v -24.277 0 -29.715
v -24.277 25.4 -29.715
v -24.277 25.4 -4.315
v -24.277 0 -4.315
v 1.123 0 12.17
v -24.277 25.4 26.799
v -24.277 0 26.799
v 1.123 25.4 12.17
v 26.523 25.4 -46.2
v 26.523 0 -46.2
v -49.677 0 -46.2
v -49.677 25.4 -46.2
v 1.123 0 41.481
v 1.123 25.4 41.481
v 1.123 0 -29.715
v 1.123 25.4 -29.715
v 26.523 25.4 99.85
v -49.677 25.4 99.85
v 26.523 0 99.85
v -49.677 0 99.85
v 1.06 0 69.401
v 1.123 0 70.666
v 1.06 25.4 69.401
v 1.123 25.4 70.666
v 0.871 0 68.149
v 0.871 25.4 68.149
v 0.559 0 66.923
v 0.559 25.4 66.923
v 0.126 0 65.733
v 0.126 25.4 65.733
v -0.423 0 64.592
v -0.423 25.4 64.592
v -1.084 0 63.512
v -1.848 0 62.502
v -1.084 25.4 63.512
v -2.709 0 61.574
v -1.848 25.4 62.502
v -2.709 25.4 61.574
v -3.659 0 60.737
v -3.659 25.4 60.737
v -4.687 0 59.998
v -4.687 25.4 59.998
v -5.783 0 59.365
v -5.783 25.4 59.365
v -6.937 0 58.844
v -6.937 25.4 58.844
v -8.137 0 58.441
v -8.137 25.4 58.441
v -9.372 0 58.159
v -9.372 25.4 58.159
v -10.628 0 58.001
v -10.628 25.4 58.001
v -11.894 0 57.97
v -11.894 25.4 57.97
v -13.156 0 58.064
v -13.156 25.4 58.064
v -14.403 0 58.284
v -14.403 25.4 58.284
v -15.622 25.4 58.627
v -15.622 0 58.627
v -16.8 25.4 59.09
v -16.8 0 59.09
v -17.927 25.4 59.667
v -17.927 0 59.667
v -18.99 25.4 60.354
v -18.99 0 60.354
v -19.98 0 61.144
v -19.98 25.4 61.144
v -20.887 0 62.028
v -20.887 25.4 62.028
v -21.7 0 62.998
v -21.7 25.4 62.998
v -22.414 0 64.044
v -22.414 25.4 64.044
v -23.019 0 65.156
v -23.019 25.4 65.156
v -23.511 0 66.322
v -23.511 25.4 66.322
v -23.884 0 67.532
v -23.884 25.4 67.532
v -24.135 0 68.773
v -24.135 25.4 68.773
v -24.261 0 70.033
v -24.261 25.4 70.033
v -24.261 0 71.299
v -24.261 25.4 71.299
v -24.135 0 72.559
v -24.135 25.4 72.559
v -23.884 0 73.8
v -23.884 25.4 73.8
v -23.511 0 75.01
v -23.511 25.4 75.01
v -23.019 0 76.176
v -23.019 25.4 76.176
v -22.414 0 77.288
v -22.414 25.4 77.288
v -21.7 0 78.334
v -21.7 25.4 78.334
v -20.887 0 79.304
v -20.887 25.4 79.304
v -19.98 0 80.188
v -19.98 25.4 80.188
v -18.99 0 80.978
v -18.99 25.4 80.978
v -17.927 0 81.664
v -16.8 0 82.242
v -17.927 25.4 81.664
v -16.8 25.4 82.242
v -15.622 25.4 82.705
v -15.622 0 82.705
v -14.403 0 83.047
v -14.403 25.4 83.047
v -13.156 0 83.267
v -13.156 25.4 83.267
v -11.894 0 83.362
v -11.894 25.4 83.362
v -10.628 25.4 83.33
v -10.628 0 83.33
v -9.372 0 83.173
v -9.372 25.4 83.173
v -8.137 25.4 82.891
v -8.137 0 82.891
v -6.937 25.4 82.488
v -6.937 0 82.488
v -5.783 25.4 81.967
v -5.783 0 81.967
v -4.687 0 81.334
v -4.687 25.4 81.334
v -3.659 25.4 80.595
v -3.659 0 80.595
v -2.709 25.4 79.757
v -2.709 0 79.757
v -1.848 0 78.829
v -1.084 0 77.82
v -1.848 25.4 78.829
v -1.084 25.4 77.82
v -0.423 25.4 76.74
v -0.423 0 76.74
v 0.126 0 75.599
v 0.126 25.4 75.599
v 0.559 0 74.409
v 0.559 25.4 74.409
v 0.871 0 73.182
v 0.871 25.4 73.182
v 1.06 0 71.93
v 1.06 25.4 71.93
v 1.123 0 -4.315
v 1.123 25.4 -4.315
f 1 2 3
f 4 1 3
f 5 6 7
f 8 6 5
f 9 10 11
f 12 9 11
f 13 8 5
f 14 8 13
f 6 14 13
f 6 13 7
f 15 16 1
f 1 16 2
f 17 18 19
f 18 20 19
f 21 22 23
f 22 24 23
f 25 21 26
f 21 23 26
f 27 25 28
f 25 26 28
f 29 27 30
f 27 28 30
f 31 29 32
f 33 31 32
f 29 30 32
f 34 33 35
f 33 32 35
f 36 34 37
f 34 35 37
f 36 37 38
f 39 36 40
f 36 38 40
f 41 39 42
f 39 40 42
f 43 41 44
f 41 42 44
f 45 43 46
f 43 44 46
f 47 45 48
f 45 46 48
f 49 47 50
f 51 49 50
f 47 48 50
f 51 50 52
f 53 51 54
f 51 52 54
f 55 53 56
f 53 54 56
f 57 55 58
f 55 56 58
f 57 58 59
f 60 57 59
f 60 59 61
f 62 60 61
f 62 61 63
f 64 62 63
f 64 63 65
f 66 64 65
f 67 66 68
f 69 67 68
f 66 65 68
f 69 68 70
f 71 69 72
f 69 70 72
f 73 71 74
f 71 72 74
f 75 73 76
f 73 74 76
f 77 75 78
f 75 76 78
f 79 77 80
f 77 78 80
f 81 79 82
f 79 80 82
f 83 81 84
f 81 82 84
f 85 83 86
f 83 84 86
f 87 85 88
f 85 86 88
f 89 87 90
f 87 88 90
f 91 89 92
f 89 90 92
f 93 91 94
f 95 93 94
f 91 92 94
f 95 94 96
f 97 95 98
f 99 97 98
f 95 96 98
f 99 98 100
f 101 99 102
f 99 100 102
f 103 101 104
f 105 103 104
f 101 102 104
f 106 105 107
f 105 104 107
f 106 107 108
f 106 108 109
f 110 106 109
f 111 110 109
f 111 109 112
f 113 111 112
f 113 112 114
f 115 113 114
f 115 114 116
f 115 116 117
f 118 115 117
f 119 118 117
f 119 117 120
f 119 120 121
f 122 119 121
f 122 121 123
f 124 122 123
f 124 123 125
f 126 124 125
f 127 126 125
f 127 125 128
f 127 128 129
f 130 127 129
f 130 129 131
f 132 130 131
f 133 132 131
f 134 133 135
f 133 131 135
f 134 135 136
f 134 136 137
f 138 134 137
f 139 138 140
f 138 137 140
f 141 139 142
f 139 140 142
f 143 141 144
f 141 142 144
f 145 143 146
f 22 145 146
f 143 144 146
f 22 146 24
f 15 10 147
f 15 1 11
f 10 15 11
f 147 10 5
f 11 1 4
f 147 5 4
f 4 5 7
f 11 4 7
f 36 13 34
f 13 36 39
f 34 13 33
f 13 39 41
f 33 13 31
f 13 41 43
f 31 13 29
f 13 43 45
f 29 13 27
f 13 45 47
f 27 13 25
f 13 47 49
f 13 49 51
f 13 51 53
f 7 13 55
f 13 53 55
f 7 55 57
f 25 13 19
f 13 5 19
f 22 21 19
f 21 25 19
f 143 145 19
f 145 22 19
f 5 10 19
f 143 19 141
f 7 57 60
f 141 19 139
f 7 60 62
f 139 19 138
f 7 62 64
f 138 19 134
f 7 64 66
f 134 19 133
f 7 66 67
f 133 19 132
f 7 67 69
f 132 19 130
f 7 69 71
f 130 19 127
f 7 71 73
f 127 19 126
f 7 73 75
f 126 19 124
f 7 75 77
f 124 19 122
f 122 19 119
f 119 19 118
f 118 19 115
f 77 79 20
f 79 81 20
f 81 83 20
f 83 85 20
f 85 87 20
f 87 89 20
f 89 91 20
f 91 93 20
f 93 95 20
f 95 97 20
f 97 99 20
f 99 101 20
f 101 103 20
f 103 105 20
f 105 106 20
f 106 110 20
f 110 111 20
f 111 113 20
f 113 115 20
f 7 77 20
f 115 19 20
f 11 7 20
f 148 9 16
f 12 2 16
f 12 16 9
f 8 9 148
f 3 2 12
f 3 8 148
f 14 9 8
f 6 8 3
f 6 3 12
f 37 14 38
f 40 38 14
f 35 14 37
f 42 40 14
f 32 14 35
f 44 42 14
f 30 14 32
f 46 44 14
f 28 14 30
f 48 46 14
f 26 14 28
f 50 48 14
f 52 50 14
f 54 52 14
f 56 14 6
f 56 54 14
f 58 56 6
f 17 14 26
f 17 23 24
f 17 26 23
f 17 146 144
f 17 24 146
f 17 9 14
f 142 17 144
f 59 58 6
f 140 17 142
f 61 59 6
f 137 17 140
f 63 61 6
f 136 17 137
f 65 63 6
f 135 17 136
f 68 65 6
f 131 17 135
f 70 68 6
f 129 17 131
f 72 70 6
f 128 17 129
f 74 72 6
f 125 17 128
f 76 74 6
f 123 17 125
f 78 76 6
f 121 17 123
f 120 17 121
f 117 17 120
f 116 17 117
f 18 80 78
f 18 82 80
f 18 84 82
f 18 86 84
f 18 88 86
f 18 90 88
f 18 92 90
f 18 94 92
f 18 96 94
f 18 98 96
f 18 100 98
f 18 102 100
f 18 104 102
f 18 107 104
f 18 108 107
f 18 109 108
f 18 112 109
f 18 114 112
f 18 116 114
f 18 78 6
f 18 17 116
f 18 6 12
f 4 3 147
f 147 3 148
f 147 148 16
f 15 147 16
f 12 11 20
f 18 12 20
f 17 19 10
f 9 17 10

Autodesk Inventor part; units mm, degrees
ref_plane "YZ Plane" through (0, 0, 0) normal (1, 0, 0) x (0, 1, 0)
ref_plane "XZ Plane" through (0, 0, 0) normal (0, 1, 0) x (-1, 0, 0)
ref_plane "XY Plane" through (0, 0, 0) normal (0, 0, 1) x (1, 0, 0)
sketch "Sketch1" plane through (0, 0, 0) normal (0, 1, 0) x (-1, 0, 0)
  line L0 (49.6769, 99.8505) -> (-26.5231, 99.8505)
  line L1 (-26.5231, 99.8505) -> (-26.5231, -46.1995)
  line L2 (-26.5231, -46.1995) -> (49.6769, -46.1995)
  line L3 (49.6769, -46.1995) -> (49.6769, 99.8505)
  point P0 (0, 0)
  dimension "d0" = 146.05
  dimension "d1" = 76.2
extrude "Extrusion1" add sketch "Sketch1" along normal blind 25.4
sketch "Sketch2" plane through (0, 25.4, 0) normal (0, 1, 0) x (1, 0, 0)
  circle A0 centre (-11.5769, -70.6659) radius 12.7
  line L0 (-49.6769, 46.1995) -> (-49.6769, -99.8505) projected
  line L1 (-49.6769, -99.8505) -> (26.5231, -99.8505) projected
  point P0 (0, 0)
  dimension "d4" = 25.4
  dimension "d5" = 38.1
  dimension "d6" = 29.1846
extrude "Extrusion2" cut sketch "Sketch2" against normal blind 25.4
sketch "Sketch3" plane through (0, 25.4, 0) normal (0, 1, 0) x (1, 0, 0)
  line L0 (-24.2769, 4.3149) -> (1.1231, 4.3149)
  line L1 (1.1231, 4.3149) -> (1.1231, 29.7149)
  line L2 (1.1231, 29.7149) -> (-24.2769, 29.7149)
  line L3 (-24.2769, 29.7149) -> (-24.2769, 4.3149)
  line L4 (26.5231, 46.1995) -> (-49.6769, 46.1995) projected
  line L5 (26.5231, -99.8505) -> (26.5231, 46.1995) projected
  point P0 (0, 0)
  dimension "d9" = 25.4
  dimension "d10" = 16.4846
  dimension "d11" = 25.4
extrude "Extrusion3" cut sketch "Sketch3" against normal blind 25.4
sketch "Sketch4" plane through (0, 25.4, 0) normal (0, 1, 0) x (1, 0, 0)
  line L0 (1.1231, -12.1697) -> (1.1231, -41.4813)
  line L1 (1.1231, -41.4813) -> (-24.2769, -26.7988)
  line L2 (-24.2769, -26.7988) -> (1.1231, -12.1697)
  line L3 (26.5231, 46.1995) -> (-49.6769, 46.1995) projected
  line L4 (26.5231, -99.8505) -> (26.5231, 46.1995) projected
  point P0 (0, 0)
  dimension "d14" = 25.4
  dimension "d15" = 29.3116
  dimension "d16" = 58.3692
  dimension "d17" = 25.4
extrude "Extrusion4" cut sketch "Sketch4" against normal blind 25.4
properties part number "Pegboard new"
